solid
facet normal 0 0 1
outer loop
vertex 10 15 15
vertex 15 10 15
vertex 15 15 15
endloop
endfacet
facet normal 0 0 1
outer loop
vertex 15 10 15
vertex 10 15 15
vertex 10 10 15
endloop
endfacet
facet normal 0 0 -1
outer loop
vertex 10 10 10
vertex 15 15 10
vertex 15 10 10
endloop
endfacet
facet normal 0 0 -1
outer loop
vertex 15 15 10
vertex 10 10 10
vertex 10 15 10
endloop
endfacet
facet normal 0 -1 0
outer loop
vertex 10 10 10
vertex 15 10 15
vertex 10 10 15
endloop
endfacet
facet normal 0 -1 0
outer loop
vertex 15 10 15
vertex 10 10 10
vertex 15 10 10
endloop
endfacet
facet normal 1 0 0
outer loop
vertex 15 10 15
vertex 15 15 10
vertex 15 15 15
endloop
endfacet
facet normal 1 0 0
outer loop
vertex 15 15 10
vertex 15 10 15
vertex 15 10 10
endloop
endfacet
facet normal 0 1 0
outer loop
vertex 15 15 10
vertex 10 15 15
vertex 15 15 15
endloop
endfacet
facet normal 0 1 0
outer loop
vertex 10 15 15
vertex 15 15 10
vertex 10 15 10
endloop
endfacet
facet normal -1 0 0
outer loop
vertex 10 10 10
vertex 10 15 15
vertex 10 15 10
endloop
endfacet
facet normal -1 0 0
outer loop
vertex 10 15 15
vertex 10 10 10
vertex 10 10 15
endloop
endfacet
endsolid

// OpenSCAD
union() {
  translate([10, 10, 10]) cube(size=[5, 5, 5]);
}
